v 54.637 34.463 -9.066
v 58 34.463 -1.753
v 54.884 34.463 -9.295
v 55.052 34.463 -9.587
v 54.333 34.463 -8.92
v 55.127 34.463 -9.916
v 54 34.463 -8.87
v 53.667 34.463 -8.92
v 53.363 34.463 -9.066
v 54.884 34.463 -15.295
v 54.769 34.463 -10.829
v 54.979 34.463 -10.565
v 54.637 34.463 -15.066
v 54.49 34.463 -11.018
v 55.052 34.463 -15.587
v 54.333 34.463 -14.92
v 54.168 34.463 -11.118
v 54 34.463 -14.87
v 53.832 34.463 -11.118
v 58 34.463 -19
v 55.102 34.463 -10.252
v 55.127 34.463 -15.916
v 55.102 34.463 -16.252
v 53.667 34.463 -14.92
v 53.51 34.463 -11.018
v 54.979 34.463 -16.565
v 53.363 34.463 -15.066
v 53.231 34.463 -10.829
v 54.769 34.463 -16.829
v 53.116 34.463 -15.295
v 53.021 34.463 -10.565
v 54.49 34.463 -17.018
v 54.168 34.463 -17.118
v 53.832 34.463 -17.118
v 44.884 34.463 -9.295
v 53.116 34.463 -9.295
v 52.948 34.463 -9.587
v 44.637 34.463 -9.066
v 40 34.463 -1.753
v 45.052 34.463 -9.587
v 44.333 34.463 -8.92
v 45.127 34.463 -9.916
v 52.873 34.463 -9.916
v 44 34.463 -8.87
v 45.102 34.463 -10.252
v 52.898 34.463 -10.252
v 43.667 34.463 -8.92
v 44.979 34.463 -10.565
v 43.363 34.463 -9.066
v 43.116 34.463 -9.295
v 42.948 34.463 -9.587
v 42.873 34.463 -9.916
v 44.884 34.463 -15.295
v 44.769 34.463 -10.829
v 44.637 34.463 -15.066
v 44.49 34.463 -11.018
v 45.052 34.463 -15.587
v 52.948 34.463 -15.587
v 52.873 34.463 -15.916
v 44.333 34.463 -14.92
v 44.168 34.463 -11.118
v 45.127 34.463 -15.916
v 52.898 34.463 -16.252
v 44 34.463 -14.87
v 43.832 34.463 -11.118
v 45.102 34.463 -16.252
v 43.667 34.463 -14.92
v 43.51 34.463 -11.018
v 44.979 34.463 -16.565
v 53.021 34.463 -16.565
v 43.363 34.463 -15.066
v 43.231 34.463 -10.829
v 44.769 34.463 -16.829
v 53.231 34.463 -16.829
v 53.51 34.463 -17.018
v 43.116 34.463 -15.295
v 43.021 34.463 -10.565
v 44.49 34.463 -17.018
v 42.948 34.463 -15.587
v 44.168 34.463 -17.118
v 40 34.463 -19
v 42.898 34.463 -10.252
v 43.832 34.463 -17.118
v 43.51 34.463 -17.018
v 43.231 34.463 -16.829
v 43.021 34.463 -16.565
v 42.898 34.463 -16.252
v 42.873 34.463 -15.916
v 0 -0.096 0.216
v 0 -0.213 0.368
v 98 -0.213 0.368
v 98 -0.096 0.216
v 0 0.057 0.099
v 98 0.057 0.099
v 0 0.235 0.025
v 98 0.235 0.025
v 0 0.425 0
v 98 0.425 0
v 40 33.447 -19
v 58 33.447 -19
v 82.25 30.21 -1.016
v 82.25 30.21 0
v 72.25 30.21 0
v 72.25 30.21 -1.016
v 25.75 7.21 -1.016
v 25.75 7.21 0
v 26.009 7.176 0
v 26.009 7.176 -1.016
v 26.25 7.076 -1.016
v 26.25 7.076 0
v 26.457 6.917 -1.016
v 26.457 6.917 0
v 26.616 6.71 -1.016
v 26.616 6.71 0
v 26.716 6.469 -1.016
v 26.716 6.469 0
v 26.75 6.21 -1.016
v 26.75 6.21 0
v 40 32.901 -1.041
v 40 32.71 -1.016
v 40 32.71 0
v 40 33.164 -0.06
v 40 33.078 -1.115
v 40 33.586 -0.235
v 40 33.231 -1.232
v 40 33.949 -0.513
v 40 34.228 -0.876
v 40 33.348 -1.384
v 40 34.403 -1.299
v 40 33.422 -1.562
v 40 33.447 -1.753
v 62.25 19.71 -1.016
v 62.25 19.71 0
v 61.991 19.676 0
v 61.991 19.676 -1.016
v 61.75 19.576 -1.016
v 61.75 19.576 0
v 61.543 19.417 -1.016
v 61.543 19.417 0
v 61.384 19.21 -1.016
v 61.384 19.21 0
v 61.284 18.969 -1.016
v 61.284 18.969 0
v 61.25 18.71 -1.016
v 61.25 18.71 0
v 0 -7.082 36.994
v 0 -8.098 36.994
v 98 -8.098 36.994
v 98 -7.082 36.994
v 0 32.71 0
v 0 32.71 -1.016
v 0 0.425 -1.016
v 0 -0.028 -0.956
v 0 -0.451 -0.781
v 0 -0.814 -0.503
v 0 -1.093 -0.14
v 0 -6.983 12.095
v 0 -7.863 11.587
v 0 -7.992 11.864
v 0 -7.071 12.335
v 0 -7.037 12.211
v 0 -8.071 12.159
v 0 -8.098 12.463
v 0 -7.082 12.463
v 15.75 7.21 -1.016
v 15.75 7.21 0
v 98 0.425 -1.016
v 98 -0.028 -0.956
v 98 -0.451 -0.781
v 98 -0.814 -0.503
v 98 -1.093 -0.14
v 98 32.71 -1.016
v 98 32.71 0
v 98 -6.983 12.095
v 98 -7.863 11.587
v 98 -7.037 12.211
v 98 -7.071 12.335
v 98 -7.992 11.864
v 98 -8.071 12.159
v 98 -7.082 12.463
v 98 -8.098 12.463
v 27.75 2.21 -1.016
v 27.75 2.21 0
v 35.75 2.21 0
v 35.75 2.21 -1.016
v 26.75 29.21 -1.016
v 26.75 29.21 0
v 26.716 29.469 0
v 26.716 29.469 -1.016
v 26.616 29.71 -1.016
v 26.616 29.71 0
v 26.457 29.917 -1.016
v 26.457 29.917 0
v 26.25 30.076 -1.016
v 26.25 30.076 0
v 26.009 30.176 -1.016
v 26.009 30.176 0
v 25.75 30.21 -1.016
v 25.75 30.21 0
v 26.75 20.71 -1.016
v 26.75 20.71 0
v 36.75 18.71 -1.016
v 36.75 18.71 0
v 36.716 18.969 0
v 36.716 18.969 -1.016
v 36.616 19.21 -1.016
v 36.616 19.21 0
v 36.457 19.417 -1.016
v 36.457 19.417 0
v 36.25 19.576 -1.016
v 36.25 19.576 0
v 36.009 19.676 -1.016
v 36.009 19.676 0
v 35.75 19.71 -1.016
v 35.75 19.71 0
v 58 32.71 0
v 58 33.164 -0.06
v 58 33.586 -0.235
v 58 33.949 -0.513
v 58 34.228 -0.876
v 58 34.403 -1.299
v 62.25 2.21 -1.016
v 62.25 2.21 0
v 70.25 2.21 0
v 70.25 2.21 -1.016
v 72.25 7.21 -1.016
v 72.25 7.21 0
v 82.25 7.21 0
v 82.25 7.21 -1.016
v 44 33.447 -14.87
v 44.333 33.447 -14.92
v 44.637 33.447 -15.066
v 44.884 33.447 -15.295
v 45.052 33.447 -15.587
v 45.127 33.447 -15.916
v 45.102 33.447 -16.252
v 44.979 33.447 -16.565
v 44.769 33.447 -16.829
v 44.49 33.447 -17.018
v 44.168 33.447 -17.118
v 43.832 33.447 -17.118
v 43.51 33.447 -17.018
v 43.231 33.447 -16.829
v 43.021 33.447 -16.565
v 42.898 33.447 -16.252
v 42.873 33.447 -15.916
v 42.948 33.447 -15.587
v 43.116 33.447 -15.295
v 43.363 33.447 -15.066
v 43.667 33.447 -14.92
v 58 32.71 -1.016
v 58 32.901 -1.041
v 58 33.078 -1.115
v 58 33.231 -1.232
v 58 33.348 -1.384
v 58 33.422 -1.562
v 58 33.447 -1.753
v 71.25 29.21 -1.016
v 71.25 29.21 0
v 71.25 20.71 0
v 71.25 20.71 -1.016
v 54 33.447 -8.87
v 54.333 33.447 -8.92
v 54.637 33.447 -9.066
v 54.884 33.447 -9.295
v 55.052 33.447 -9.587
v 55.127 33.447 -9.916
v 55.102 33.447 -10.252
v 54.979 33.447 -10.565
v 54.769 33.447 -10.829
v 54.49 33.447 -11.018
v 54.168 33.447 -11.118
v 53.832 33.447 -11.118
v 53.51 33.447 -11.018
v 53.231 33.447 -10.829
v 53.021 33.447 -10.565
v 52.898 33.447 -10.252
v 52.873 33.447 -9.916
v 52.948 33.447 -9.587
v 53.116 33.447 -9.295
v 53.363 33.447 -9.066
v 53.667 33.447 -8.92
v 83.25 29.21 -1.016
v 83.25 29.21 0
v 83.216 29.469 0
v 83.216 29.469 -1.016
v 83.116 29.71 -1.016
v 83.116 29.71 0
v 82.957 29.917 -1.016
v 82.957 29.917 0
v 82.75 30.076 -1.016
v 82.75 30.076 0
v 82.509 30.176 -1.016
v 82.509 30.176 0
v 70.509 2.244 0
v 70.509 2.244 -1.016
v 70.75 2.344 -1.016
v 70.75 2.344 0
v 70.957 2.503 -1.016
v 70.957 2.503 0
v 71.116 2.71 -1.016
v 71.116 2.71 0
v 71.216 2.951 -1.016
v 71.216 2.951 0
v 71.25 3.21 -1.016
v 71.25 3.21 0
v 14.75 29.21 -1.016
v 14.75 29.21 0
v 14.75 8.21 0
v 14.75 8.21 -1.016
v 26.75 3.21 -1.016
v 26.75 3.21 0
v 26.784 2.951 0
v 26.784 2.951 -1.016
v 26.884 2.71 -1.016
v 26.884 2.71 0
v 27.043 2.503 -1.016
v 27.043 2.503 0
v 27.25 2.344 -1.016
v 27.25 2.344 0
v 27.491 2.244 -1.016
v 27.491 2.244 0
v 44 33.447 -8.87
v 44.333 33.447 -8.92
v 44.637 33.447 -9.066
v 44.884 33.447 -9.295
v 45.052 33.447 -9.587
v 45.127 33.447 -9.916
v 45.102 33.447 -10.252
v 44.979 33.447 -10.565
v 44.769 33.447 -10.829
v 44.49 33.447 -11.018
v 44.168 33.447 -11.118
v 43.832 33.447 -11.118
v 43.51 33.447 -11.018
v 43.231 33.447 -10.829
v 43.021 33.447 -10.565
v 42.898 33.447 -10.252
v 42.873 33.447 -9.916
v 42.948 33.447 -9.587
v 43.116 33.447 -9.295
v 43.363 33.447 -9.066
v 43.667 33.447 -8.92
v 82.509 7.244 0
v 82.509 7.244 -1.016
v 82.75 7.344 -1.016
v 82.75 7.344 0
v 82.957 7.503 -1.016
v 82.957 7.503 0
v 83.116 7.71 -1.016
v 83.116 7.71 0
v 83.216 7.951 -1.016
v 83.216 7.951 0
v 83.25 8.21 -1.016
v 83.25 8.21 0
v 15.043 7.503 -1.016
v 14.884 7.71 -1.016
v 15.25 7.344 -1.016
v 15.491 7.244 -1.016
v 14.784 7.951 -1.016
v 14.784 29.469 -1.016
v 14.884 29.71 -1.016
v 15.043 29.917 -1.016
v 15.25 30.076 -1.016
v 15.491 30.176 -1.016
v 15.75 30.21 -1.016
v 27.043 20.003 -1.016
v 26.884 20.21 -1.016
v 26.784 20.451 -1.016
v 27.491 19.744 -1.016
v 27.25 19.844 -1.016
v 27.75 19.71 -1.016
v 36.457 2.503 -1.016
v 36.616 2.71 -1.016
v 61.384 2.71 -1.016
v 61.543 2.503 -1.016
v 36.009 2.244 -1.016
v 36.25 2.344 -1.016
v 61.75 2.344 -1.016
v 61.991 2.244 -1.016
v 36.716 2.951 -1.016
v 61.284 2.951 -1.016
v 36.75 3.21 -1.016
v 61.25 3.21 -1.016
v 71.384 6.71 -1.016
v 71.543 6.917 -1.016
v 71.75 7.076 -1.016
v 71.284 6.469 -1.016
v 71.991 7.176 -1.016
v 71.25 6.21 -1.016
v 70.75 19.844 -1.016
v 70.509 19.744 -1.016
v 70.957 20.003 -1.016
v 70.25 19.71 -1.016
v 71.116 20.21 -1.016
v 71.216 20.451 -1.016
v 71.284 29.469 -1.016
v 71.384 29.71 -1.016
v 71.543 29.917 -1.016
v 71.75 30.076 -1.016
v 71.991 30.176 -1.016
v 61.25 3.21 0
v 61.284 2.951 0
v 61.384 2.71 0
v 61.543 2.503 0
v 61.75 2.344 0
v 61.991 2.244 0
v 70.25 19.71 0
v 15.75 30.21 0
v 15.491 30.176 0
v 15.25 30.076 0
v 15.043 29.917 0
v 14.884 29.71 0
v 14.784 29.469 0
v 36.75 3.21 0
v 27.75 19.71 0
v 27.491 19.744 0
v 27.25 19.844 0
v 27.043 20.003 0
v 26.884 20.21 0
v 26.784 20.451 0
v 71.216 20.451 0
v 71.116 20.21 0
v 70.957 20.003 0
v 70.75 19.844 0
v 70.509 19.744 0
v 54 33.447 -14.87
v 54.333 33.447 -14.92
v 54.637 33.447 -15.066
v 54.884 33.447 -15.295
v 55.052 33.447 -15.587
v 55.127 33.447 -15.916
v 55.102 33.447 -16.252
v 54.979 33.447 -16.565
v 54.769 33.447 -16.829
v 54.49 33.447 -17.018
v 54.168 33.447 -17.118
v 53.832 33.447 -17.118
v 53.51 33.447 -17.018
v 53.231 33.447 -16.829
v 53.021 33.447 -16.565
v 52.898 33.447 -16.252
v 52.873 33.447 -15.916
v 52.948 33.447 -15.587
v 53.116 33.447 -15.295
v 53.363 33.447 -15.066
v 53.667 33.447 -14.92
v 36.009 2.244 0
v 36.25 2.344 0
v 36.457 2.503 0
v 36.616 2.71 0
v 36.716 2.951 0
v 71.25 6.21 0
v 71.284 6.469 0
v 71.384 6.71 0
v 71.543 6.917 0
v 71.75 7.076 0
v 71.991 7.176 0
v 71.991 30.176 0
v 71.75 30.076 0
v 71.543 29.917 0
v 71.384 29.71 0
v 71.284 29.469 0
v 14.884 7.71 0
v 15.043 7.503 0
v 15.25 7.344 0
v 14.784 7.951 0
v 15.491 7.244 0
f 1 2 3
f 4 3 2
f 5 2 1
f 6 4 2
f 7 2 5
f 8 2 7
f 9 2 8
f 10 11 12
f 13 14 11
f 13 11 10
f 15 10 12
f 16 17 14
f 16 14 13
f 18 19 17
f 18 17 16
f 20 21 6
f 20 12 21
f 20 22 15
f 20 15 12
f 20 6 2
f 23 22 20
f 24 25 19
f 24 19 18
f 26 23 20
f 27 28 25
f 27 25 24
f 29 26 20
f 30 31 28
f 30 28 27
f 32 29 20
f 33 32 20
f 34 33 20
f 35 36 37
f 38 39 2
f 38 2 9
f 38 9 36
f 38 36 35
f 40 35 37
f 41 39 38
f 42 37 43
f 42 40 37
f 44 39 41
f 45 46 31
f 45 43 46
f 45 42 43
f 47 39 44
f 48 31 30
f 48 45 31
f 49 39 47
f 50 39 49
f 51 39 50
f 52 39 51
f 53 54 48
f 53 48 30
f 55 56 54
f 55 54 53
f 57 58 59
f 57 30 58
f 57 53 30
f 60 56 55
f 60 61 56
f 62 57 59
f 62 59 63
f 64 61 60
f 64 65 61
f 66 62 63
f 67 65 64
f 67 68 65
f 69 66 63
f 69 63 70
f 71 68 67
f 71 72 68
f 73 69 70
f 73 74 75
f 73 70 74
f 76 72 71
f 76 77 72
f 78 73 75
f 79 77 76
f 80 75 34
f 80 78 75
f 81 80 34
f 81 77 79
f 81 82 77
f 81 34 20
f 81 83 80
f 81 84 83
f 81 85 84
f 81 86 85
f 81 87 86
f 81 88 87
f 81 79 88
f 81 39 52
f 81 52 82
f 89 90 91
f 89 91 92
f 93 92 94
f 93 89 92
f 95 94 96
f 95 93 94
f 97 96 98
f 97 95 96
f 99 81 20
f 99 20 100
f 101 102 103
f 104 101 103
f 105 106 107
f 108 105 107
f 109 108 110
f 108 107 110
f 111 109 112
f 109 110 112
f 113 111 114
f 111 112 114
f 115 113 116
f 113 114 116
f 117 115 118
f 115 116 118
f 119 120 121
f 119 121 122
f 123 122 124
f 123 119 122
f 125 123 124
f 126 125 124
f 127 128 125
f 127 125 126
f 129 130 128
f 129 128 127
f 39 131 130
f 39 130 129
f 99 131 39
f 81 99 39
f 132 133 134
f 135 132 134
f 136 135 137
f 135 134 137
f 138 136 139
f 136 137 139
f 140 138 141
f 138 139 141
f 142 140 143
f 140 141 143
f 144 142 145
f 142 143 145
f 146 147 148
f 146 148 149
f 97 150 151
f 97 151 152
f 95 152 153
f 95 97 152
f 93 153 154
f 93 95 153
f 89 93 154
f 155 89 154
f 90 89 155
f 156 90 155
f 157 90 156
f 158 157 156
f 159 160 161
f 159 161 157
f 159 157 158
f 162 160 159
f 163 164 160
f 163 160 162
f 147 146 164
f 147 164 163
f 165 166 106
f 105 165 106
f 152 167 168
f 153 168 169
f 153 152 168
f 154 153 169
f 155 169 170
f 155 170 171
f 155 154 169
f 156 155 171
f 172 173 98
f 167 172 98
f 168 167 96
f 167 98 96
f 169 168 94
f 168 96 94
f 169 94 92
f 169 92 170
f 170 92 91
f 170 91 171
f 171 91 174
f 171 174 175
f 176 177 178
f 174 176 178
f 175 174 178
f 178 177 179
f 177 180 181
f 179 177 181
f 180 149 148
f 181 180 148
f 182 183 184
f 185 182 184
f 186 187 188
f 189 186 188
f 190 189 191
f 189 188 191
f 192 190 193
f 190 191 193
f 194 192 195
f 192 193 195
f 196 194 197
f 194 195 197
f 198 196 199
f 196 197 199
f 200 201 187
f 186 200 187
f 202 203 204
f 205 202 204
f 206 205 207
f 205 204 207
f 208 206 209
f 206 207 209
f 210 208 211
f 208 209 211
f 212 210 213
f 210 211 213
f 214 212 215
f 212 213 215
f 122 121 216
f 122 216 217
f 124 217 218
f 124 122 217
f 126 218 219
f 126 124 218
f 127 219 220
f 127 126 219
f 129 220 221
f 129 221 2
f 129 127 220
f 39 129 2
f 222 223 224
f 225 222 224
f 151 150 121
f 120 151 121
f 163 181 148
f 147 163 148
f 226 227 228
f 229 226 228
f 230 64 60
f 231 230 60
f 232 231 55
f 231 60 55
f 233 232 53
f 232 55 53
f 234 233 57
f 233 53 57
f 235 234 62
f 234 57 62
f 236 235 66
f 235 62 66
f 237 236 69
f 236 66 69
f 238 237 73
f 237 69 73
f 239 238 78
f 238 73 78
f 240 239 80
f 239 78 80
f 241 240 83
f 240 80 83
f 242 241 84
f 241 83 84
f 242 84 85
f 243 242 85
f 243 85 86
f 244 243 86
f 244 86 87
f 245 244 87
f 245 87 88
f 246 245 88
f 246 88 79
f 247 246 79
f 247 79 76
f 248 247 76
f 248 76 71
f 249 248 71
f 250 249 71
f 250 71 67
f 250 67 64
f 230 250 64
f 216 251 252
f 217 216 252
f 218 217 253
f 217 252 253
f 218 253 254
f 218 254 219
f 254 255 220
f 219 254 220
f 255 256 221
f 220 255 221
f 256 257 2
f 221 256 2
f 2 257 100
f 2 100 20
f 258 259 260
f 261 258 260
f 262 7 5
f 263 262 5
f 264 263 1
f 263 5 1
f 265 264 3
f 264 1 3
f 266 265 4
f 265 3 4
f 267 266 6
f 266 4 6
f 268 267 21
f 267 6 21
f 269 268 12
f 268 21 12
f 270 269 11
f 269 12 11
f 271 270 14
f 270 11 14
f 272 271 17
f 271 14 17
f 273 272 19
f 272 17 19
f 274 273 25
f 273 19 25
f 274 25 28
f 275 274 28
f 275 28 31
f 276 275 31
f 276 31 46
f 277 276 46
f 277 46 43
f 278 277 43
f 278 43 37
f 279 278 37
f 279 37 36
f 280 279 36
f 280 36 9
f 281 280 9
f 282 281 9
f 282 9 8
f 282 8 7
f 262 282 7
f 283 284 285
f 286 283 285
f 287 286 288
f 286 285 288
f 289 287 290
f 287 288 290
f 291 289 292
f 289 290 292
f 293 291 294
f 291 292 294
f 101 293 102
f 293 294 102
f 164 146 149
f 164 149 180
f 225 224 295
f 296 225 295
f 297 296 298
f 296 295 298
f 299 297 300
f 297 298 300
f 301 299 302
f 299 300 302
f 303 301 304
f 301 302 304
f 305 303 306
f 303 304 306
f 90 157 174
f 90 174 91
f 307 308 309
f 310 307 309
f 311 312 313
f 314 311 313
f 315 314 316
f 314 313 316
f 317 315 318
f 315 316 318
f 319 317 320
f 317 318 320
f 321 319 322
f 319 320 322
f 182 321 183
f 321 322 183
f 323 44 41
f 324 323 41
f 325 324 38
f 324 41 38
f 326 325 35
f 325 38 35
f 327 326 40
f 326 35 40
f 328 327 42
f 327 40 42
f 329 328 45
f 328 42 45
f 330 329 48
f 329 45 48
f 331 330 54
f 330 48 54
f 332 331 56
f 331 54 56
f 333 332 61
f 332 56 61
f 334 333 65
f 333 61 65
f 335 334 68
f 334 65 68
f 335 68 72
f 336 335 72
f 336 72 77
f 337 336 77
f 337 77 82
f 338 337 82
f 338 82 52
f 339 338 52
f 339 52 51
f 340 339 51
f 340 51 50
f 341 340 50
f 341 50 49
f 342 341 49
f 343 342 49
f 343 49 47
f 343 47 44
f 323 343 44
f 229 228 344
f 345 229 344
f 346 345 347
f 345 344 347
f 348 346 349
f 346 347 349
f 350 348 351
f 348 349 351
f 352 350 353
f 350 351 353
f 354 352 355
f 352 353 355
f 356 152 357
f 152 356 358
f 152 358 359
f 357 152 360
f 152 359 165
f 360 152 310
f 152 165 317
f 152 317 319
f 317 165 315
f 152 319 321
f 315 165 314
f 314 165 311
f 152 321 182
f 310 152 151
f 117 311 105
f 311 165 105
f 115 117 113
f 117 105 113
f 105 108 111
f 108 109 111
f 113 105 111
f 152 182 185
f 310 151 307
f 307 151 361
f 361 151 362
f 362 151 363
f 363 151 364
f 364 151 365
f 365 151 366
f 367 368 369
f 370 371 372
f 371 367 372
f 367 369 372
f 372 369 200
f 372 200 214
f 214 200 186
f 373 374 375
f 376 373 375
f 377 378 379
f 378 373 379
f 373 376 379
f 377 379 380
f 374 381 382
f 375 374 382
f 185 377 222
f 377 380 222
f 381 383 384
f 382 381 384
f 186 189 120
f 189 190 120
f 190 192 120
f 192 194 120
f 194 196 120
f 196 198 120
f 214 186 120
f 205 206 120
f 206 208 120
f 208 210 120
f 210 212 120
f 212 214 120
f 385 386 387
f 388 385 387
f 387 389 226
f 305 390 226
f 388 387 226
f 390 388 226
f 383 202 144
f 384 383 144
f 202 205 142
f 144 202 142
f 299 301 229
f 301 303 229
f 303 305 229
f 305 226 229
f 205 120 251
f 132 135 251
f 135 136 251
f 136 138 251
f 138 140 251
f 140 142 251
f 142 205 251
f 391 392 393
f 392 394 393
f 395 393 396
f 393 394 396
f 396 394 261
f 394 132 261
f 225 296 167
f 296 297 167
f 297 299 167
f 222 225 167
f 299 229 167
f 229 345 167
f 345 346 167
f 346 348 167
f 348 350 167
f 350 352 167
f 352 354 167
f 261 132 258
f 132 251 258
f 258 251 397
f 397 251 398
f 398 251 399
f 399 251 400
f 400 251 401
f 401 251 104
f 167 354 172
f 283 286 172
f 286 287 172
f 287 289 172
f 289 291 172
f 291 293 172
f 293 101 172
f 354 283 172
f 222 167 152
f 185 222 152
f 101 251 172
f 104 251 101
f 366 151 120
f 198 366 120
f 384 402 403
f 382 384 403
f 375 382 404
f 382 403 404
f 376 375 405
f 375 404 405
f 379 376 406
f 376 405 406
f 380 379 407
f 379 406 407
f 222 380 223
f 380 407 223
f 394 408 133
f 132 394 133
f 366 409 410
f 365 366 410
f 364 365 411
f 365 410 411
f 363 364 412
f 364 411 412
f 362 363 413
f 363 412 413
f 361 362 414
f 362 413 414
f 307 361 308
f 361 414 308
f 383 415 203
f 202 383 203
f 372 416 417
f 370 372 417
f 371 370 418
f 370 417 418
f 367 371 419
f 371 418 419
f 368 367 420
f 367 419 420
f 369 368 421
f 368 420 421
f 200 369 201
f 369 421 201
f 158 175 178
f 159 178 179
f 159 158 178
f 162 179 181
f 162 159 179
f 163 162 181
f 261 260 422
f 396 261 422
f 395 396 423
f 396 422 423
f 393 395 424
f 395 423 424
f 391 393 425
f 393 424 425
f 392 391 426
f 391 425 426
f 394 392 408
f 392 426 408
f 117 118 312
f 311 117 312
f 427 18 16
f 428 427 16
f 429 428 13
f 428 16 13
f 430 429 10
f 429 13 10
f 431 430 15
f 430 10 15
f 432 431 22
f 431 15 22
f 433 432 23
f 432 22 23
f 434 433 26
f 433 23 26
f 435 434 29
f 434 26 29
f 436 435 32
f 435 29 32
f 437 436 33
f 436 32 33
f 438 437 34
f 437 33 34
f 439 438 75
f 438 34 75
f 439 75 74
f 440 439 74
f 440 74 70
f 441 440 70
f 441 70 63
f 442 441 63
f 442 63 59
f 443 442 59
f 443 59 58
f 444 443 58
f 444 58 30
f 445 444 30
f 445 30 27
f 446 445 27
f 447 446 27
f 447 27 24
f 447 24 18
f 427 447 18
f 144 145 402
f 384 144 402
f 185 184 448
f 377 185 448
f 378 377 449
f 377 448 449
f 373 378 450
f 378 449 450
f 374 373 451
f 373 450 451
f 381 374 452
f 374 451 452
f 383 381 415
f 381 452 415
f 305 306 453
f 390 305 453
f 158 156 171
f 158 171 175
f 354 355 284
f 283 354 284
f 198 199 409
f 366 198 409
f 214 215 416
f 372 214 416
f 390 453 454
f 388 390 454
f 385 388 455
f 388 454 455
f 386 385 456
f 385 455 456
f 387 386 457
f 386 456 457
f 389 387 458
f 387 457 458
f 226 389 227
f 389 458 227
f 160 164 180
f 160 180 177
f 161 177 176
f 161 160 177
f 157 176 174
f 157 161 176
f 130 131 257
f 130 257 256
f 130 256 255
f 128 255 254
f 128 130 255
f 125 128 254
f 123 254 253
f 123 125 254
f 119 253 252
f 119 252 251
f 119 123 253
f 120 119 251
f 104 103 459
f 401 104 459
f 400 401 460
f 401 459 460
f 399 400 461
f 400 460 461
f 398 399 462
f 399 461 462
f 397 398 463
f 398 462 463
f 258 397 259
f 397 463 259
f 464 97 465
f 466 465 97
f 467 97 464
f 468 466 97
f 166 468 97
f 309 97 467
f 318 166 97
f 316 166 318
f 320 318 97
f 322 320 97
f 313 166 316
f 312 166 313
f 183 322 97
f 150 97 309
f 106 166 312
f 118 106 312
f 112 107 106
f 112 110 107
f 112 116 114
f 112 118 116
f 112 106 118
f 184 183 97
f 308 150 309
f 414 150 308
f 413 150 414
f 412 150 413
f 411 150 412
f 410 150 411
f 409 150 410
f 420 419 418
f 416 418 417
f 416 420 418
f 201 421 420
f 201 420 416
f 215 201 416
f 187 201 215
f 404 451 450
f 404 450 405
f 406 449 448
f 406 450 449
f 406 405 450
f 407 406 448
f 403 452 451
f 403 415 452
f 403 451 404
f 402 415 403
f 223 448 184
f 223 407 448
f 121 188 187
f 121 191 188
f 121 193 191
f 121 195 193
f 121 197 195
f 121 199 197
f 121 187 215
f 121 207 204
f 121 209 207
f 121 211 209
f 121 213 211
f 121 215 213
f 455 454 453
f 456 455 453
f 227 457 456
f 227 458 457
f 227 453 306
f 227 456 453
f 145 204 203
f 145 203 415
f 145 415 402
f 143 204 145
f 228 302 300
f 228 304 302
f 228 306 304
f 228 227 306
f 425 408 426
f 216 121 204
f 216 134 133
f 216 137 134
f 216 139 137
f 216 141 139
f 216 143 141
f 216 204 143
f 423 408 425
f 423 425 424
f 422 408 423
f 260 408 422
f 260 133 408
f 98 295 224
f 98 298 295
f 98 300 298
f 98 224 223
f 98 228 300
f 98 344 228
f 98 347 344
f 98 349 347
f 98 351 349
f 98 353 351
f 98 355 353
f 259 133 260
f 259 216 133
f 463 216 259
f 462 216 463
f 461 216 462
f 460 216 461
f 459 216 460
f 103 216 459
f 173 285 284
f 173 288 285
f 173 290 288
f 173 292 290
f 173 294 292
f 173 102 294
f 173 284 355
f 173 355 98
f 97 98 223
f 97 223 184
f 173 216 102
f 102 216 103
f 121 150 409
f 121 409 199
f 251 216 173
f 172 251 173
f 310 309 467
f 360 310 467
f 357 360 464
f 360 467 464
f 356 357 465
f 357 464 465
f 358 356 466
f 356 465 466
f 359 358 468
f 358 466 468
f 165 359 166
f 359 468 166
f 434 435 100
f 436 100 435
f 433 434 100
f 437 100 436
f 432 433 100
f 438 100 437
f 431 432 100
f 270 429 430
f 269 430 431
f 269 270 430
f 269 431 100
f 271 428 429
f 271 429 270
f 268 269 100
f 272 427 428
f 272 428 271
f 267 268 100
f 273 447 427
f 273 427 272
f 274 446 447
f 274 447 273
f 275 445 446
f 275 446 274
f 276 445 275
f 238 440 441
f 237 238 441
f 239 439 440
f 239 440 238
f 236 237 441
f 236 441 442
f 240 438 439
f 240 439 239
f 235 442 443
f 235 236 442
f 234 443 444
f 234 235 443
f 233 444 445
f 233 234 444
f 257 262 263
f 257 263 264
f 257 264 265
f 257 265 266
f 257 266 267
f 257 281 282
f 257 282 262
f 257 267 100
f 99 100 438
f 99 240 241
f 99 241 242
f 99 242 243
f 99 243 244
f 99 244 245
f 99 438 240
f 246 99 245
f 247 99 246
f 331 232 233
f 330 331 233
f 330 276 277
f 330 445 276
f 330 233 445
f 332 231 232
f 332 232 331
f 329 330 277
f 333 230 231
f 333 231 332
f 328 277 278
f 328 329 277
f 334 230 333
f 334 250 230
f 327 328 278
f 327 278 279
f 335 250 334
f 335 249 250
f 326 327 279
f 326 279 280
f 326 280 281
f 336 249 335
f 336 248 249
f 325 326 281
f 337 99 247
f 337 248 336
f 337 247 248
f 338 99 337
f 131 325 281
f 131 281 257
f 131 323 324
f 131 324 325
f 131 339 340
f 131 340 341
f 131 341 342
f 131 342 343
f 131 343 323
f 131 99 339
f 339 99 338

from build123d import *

# Parameters (mm, degrees)
SKETCH1_W                    = 98
SKETCH1_H                    = 32.71
BASE_FLANGE1_DEPTH           = 1.016
EDGE_FLANGE1_DEPTH           = 18
EDGE_FLANGE2_STRIP_CUT_DEPTH = 98
EDGE_FLANGE2_DEPTH           = 98
EDGE_FLANGE3_STRIP_CUT_DEPTH = 98
EDGE_FLANGE3_DEPTH           = 98
CUT_EXTRUDE1_REACH           = 115.066
SKETCH17_R                   = 1.1303


# Sheet-metal steps are written as plain solids
with BuildPart() as part:
    # Sketch1 → Base-Flange1 (new body)
    with BuildSketch(Plane.XY):
        with Locations((49, 16.355)):
            Rectangle(SKETCH1_W, SKETCH1_H)
        with BuildLine():
            Line((61.25, 18.71), (61.25, 3.21))
            ThreePointArc((61.25, 3.21), (61.542893219, 2.502893219), (62.25, 2.21))
            Line((62.25, 2.21), (70.25, 2.21))
            ThreePointArc((70.25, 2.21), (70.957106781, 2.502893219), (71.25, 3.21))
            Line((71.25, 3.21), (71.25, 6.21))
            ThreePointArc((71.25, 6.21), (71.542893219, 6.917106781), (72.25, 7.21))
            Line((72.25, 7.21), (82.25, 7.21))
            ThreePointArc((82.25, 7.21), (82.957106781, 7.502893219), (83.25, 8.21))
            Line((83.25, 8.21), (83.25, 29.21))
            ThreePointArc((83.25, 29.21), (82.957106781, 29.917106781), (82.25, 30.21))
            Line((82.25, 30.21), (72.25, 30.21))
            ThreePointArc((72.25, 30.21), (71.542893219, 29.917106781), (71.25, 29.21))
            Line((71.25, 29.21), (71.25, 20.71))
            ThreePointArc((71.25, 20.71), (70.957106781, 20.002893219), (70.25, 19.71))
            Line((70.25, 19.71), (62.25, 19.71))
            ThreePointArc((62.25, 19.71), (61.542893219, 19.417106781), (61.25, 18.71))
        make_face(mode=Mode.SUBTRACT)
        with BuildLine():
            Line((25.75, 30.21), (15.75, 30.21))
            ThreePointArc((15.75, 30.21), (15.042893219, 29.917106781), (14.75, 29.21))
            Line((14.75, 29.21), (14.75, 8.21))
            ThreePointArc((14.75, 8.21), (15.042893219, 7.502893219), (15.75, 7.21))
            Line((15.75, 7.21), (25.75, 7.21))
            ThreePointArc((25.75, 7.21), (26.457106781, 6.917106781), (26.75, 6.21))
            Line((26.75, 6.21), (26.75, 3.21))
            ThreePointArc((26.75, 3.21), (27.042893219, 2.502893219), (27.75, 2.21))
            Line((27.75, 2.21), (35.75, 2.21))
            ThreePointArc((35.75, 2.21), (36.457106781, 2.502893219), (36.75, 3.21))
            Line((36.75, 3.21), (36.75, 18.71))
            ThreePointArc((36.75, 18.71), (36.457106781, 19.417106781), (35.75, 19.71))
            Line((35.75, 19.71), (27.75, 19.71))
            ThreePointArc((27.75, 19.71), (27.042893219, 20.002893219), (26.75, 20.71))
            Line((26.75, 20.71), (26.75, 29.21))
            ThreePointArc((26.75, 29.21), (26.457106781, 29.917106781), (25.75, 30.21))
        make_face(mode=Mode.SUBTRACT)
    extrude(amount=-BASE_FLANGE1_DEPTH)

    # Edge-Flange1 section (across the edge) → Edge-Flange1 (add)
    with BuildSketch(Plane(origin=(40, 33.4466, -1.016), x_dir=(0, -1, 0), z_dir=(1, 0, 0))):
        with BuildLine():
            Line((-1.016, 0.7366), (-1.016, 17.984))
            Line((-1.016, 17.984), (0, 17.984))
            Line((0, 17.984), (0, 0.7366))
            ThreePointArc((0, 0.7366), (0.215745145, 0.215745145), (0.7366, 0))
            Line((0.7366, 0), (0.7366, -1.016))
            ThreePointArc((0.7366, -1.016), (-0.502675345, -0.502675345), (-1.016, 0.7366))
        make_face()
    extrude(amount=EDGE_FLANGE1_DEPTH)

    # Edge-Flange2 strip (across the edge) → Edge-Flange2 strip cut (cut)
    with BuildSketch(Plane(origin=(0, 0, 0), x_dir=(0, 0.8660254037844364, 0.5000000000000041), z_dir=(1, 0, 0))):
        Polygon((-4.935055866, 1.676080086), (-0.1397, -1.092519914), (0.3683, -0.212638104), (-4.427055866, 2.555961896), align=None)
    extrude(amount=EDGE_FLANGE2_STRIP_CUT_DEPTH, mode=Mode.SUBTRACT)

    # Edge-Flange2 section (across the edge) → Edge-Flange2 (add)
    with BuildSketch(Plane(origin=(0, 0, 0), x_dir=(0, 0.8660254037844364, 0.5000000000000041), z_dir=(1, 0, 0))):
        with BuildLine():
            Line((-1.016, 0.425276208), (-1.016, 14.163412127))
            Line((-1.016, 14.163412127), (0, 14.163412127))
            Line((0, 14.163412127), (0, 0.425276208))
            ThreePointArc((0, 0.425276208), (0.098685688, 0.056976208), (0.3683, -0.212638104))
            Line((0.3683, -0.212638104), (-0.1397, -1.092519914))
            ThreePointArc((-0.1397, -1.092519914), (-0.781196123, -0.451023792), (-1.016, 0.425276208))
        make_face()
    extrude(amount=EDGE_FLANGE2_DEPTH)

    # Edge-Flange3 strip (across the edge) → Edge-Flange3 strip cut (cut)
    with BuildSketch(Plane(origin=(0, -7.081706063, 12.265874706), x_dir=(0, 1, 0), z_dir=(1, 0, 0))):
        Polygon((-3.549796123, 4.116427241), (-0.781196123, -0.678928625), (0.098685688, -0.170928625), (-2.669914312, 4.624427241), align=None)
    extrude(amount=EDGE_FLANGE3_STRIP_CUT_DEPTH, mode=Mode.SUBTRACT)

    # Edge-Flange3 section (across the edge) → Edge-Flange3 (add)
    with BuildSketch(Plane(origin=(0, -7.081706063, 12.265874706), x_dir=(0, 1, 0), z_dir=(1, 0, 0))):
        with BuildLine():
            Line((-1.016, 0.197371375), (-1.016, 24.72776362))
            Line((-1.016, 24.72776362), (0, 24.72776362))
            Line((0, 24.72776362), (0, 0.197371375))
            ThreePointArc((0, 0.197371375), (0.025099036, 0.006725267), (0.098685688, -0.170928625))
            Line((0.098685688, -0.170928625), (-0.781196123, -0.678928625))
            ThreePointArc((-0.781196123, -0.678928625), (-0.956281603, -0.256234883), (-1.016, 0.197371375))
        make_face()
    extrude(amount=EDGE_FLANGE3_DEPTH)

    # Sketch17 → Cut-Extrude1 (cut, up to next)
    with BuildSketch(Plane(origin=(0, 34.4626, 0), x_dir=(1, 0, 0), z_dir=(0, 1, 0)), mode=Mode.PRIVATE) as cut_extrude1_sk1:
        with Locations(Location((54, 10, 0), (0, 0, 270))):
            Circle(SKETCH17_R)
    cut_extrude1_tool1 = extrude(cut_extrude1_sk1.sketch, amount=-CUT_EXTRUDE1_REACH, mode=Mode.PRIVATE) & part.part
    # Sketch17 → Cut-Extrude1 (cut, up to next)
    with BuildSketch(Plane(origin=(0, 34.4626, 0), x_dir=(1, 0, 0), z_dir=(0, 1, 0)), mode=Mode.PRIVATE) as cut_extrude1_sk2:
        with Locations(Location((54, 16, 0), (0, 0, 270))):
            Circle(SKETCH17_R)
    cut_extrude1_tool2 = extrude(cut_extrude1_sk2.sketch, amount=-CUT_EXTRUDE1_REACH, mode=Mode.PRIVATE) & part.part
    # Sketch17 → Cut-Extrude1 (cut, up to next)
    with BuildSketch(Plane(origin=(0, 34.4626, 0), x_dir=(1, 0, 0), z_dir=(0, 1, 0)), mode=Mode.PRIVATE) as cut_extrude1_sk3:
        with Locations(Location((44, 10, 0), (0, 0, 270))):
            Circle(SKETCH17_R)
    cut_extrude1_tool3 = extrude(cut_extrude1_sk3.sketch, amount=-CUT_EXTRUDE1_REACH, mode=Mode.PRIVATE) & part.part
    # Sketch17 → Cut-Extrude1 (cut, up to next)
    with BuildSketch(Plane(origin=(0, 34.4626, 0), x_dir=(1, 0, 0), z_dir=(0, 1, 0)), mode=Mode.PRIVATE) as cut_extrude1_sk4:
        with Locations(Location((44, 16, 0), (0, 0, 270))):
            Circle(SKETCH17_R)
    cut_extrude1_tool4 = extrude(cut_extrude1_sk4.sketch, amount=-CUT_EXTRUDE1_REACH, mode=Mode.PRIVATE) & part.part
    add(cut_extrude1_tool1.solids().sort_by_distance((54, 34.4626, -10))[0], mode=Mode.SUBTRACT)
    add(cut_extrude1_tool2.solids().sort_by_distance((54, 34.4626, -16))[0], mode=Mode.SUBTRACT)
    add(cut_extrude1_tool3.solids().sort_by_distance((44, 34.4626, -10))[0], mode=Mode.SUBTRACT)
    add(cut_extrude1_tool4.solids().sort_by_distance((44, 34.4626, -16))[0], mode=Mode.SUBTRACT)


solid = part.part
